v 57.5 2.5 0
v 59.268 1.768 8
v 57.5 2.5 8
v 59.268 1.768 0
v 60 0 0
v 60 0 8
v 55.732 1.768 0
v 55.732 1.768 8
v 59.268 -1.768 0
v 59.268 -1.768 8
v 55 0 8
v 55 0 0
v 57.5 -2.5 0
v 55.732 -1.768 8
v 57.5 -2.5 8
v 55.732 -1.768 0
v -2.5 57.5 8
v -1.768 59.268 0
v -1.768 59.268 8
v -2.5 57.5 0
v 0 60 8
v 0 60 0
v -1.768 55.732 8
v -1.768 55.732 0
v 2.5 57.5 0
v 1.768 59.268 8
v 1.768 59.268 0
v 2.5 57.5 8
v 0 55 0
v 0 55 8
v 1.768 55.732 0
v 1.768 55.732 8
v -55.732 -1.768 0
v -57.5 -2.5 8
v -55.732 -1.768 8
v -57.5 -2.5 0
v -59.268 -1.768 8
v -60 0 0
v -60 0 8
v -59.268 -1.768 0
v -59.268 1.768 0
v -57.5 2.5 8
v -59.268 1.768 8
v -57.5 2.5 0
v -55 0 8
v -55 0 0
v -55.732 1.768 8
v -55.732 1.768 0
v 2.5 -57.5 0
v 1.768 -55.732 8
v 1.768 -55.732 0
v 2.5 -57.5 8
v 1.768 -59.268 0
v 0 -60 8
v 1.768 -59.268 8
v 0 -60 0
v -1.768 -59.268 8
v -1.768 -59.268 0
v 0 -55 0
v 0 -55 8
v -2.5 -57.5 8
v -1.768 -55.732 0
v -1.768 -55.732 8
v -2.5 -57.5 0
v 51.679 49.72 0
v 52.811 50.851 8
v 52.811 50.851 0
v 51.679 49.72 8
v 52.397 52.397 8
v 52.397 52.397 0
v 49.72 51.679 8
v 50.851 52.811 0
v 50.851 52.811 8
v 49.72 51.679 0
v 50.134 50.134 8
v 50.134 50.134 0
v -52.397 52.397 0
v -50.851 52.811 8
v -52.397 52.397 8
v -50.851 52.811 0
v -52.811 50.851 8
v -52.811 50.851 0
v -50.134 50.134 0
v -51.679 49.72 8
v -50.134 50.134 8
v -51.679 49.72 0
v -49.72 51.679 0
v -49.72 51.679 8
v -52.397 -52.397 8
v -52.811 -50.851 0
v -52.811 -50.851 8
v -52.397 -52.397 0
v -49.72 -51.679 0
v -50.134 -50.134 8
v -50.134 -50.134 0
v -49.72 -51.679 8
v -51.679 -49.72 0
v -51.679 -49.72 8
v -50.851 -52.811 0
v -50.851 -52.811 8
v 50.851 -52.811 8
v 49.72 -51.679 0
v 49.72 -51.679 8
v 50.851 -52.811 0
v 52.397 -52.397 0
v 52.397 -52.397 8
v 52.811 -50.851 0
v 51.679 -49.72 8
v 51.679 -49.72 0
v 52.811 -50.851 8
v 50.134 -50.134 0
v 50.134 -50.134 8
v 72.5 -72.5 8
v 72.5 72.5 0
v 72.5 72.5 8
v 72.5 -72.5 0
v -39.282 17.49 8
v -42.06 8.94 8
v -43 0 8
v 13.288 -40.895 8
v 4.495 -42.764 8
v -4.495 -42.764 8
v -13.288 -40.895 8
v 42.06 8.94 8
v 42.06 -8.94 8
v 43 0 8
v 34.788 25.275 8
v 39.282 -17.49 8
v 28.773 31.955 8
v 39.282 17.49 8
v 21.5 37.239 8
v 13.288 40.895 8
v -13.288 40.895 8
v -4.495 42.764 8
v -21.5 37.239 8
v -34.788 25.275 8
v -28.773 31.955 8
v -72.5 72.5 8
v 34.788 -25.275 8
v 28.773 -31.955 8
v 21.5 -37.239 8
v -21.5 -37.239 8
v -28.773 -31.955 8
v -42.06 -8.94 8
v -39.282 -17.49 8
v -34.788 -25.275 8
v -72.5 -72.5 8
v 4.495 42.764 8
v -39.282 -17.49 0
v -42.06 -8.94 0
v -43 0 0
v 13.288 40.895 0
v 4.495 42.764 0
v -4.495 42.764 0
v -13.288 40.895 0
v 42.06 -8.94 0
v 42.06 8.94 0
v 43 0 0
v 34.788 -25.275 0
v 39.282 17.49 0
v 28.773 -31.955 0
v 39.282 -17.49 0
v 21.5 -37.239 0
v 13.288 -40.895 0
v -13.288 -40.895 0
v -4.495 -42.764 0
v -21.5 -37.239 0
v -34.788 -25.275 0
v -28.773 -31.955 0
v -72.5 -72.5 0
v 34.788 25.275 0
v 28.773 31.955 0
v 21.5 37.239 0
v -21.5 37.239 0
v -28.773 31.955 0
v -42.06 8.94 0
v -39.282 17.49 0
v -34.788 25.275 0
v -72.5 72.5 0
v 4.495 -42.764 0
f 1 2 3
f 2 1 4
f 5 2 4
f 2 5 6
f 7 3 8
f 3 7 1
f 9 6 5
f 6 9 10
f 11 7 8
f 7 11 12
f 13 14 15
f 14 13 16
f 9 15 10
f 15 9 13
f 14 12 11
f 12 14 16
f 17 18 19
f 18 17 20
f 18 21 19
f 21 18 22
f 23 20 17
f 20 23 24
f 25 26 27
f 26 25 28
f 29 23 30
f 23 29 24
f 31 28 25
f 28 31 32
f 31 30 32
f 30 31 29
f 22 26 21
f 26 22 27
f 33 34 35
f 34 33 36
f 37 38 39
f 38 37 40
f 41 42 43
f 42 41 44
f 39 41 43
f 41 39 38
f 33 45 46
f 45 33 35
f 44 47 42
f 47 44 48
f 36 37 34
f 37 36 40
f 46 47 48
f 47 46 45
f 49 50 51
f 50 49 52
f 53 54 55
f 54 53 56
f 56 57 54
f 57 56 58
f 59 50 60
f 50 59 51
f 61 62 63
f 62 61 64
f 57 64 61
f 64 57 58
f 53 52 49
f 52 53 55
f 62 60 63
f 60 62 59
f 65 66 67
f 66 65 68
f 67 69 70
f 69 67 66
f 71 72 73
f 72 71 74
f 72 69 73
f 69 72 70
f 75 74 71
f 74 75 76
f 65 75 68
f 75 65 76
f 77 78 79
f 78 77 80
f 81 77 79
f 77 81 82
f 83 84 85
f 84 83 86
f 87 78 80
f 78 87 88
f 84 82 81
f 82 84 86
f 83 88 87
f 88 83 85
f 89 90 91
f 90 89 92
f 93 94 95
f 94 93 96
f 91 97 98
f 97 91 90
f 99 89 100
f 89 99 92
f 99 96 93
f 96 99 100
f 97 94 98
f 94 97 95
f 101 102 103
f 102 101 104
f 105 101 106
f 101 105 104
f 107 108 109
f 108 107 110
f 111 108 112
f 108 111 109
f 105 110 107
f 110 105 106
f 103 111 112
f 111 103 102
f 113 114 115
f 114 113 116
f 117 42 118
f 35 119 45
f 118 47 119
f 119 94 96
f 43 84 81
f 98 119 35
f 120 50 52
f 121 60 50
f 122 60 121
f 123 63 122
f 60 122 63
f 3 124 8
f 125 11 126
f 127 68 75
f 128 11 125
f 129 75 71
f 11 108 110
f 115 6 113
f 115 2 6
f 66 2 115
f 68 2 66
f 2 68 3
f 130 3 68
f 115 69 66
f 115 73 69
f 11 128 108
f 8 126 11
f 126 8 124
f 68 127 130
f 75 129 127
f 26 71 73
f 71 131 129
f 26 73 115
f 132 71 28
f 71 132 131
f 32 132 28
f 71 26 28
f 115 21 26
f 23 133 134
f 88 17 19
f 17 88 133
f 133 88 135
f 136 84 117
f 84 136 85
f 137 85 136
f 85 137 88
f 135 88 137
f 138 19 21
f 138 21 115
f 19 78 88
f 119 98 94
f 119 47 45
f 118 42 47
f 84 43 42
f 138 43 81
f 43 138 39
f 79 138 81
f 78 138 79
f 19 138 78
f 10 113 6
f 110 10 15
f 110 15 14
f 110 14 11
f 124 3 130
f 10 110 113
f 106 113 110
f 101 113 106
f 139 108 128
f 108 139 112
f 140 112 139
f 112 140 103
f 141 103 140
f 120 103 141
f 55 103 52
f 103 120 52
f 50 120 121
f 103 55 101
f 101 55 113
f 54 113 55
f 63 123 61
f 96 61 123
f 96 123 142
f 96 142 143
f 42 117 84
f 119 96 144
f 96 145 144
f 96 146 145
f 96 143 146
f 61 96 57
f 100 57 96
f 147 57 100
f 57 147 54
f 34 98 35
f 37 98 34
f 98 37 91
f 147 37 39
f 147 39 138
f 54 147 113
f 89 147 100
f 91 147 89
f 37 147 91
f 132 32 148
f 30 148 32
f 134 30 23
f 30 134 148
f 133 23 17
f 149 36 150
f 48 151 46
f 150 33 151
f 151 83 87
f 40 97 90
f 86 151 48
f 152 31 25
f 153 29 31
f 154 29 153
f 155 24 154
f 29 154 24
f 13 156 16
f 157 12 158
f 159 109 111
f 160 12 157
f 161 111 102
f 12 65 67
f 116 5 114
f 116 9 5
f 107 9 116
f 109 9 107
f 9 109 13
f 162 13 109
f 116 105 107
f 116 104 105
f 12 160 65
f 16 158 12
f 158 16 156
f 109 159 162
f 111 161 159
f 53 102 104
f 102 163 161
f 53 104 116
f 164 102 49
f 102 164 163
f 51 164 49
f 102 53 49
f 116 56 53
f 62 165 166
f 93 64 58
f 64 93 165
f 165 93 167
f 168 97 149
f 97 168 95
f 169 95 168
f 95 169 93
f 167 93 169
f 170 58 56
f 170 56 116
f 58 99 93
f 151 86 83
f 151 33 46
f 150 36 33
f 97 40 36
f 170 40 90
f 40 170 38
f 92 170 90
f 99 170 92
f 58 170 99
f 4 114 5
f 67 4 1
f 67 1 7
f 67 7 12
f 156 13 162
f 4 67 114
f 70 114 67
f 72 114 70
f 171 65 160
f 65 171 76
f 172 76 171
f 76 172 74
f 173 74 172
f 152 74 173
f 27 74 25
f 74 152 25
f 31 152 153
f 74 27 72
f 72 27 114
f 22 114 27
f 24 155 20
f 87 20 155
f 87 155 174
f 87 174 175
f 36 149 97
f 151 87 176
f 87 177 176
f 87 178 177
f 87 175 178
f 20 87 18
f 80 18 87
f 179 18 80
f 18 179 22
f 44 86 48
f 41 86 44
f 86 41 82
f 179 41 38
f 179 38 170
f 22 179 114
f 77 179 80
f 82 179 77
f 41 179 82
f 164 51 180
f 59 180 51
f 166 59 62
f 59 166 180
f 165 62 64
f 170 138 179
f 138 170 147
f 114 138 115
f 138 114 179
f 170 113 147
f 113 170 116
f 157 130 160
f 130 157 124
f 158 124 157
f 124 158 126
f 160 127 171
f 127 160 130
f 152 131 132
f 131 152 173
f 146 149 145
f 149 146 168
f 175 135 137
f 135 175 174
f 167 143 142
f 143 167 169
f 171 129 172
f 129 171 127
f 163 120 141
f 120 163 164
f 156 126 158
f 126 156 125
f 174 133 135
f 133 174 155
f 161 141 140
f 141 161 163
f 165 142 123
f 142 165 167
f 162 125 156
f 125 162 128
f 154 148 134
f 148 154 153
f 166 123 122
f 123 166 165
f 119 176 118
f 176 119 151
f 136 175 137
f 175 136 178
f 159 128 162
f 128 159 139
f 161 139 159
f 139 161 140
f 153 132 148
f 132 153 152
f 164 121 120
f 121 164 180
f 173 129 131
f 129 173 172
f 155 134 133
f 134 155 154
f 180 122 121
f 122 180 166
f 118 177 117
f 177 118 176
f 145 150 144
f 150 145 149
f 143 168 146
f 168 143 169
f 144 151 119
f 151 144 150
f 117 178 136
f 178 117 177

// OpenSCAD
// Adaptor plate for mounting a trackball (U-Trak from ultimarc.com) on a metal plate.

// Dimensions in millimetres.
plate_thickness = 8;
size = 145;

// Centre mount hole is 82mm, 86 with bezel.
hole = 86;

 difference() {
  translate([-size/2, -size/2, 0]) {
    cube([size, size, 19-3-plate_thickness]);
  }
  cylinder(d=hole, h=20, center=true);
  // Trackball's through-hole screws are 5mm diameter.
  for (angle = [0:90:270]) {
    rotate([0, 0, angle]) {
      translate([57.5, 0, 0]) {
        cylinder(d=5, h=20, center=true);
      }
    }
  }
  // Panel's mounting studs are 20mm M3.
  for (angle = [0:90:270]) {
      rotate([0,0,angle+45]) {
          translate([size/2, 0, 0]) {
              cylinder(d=3.2, h=20, center=true);
          }
      }
  }
}
